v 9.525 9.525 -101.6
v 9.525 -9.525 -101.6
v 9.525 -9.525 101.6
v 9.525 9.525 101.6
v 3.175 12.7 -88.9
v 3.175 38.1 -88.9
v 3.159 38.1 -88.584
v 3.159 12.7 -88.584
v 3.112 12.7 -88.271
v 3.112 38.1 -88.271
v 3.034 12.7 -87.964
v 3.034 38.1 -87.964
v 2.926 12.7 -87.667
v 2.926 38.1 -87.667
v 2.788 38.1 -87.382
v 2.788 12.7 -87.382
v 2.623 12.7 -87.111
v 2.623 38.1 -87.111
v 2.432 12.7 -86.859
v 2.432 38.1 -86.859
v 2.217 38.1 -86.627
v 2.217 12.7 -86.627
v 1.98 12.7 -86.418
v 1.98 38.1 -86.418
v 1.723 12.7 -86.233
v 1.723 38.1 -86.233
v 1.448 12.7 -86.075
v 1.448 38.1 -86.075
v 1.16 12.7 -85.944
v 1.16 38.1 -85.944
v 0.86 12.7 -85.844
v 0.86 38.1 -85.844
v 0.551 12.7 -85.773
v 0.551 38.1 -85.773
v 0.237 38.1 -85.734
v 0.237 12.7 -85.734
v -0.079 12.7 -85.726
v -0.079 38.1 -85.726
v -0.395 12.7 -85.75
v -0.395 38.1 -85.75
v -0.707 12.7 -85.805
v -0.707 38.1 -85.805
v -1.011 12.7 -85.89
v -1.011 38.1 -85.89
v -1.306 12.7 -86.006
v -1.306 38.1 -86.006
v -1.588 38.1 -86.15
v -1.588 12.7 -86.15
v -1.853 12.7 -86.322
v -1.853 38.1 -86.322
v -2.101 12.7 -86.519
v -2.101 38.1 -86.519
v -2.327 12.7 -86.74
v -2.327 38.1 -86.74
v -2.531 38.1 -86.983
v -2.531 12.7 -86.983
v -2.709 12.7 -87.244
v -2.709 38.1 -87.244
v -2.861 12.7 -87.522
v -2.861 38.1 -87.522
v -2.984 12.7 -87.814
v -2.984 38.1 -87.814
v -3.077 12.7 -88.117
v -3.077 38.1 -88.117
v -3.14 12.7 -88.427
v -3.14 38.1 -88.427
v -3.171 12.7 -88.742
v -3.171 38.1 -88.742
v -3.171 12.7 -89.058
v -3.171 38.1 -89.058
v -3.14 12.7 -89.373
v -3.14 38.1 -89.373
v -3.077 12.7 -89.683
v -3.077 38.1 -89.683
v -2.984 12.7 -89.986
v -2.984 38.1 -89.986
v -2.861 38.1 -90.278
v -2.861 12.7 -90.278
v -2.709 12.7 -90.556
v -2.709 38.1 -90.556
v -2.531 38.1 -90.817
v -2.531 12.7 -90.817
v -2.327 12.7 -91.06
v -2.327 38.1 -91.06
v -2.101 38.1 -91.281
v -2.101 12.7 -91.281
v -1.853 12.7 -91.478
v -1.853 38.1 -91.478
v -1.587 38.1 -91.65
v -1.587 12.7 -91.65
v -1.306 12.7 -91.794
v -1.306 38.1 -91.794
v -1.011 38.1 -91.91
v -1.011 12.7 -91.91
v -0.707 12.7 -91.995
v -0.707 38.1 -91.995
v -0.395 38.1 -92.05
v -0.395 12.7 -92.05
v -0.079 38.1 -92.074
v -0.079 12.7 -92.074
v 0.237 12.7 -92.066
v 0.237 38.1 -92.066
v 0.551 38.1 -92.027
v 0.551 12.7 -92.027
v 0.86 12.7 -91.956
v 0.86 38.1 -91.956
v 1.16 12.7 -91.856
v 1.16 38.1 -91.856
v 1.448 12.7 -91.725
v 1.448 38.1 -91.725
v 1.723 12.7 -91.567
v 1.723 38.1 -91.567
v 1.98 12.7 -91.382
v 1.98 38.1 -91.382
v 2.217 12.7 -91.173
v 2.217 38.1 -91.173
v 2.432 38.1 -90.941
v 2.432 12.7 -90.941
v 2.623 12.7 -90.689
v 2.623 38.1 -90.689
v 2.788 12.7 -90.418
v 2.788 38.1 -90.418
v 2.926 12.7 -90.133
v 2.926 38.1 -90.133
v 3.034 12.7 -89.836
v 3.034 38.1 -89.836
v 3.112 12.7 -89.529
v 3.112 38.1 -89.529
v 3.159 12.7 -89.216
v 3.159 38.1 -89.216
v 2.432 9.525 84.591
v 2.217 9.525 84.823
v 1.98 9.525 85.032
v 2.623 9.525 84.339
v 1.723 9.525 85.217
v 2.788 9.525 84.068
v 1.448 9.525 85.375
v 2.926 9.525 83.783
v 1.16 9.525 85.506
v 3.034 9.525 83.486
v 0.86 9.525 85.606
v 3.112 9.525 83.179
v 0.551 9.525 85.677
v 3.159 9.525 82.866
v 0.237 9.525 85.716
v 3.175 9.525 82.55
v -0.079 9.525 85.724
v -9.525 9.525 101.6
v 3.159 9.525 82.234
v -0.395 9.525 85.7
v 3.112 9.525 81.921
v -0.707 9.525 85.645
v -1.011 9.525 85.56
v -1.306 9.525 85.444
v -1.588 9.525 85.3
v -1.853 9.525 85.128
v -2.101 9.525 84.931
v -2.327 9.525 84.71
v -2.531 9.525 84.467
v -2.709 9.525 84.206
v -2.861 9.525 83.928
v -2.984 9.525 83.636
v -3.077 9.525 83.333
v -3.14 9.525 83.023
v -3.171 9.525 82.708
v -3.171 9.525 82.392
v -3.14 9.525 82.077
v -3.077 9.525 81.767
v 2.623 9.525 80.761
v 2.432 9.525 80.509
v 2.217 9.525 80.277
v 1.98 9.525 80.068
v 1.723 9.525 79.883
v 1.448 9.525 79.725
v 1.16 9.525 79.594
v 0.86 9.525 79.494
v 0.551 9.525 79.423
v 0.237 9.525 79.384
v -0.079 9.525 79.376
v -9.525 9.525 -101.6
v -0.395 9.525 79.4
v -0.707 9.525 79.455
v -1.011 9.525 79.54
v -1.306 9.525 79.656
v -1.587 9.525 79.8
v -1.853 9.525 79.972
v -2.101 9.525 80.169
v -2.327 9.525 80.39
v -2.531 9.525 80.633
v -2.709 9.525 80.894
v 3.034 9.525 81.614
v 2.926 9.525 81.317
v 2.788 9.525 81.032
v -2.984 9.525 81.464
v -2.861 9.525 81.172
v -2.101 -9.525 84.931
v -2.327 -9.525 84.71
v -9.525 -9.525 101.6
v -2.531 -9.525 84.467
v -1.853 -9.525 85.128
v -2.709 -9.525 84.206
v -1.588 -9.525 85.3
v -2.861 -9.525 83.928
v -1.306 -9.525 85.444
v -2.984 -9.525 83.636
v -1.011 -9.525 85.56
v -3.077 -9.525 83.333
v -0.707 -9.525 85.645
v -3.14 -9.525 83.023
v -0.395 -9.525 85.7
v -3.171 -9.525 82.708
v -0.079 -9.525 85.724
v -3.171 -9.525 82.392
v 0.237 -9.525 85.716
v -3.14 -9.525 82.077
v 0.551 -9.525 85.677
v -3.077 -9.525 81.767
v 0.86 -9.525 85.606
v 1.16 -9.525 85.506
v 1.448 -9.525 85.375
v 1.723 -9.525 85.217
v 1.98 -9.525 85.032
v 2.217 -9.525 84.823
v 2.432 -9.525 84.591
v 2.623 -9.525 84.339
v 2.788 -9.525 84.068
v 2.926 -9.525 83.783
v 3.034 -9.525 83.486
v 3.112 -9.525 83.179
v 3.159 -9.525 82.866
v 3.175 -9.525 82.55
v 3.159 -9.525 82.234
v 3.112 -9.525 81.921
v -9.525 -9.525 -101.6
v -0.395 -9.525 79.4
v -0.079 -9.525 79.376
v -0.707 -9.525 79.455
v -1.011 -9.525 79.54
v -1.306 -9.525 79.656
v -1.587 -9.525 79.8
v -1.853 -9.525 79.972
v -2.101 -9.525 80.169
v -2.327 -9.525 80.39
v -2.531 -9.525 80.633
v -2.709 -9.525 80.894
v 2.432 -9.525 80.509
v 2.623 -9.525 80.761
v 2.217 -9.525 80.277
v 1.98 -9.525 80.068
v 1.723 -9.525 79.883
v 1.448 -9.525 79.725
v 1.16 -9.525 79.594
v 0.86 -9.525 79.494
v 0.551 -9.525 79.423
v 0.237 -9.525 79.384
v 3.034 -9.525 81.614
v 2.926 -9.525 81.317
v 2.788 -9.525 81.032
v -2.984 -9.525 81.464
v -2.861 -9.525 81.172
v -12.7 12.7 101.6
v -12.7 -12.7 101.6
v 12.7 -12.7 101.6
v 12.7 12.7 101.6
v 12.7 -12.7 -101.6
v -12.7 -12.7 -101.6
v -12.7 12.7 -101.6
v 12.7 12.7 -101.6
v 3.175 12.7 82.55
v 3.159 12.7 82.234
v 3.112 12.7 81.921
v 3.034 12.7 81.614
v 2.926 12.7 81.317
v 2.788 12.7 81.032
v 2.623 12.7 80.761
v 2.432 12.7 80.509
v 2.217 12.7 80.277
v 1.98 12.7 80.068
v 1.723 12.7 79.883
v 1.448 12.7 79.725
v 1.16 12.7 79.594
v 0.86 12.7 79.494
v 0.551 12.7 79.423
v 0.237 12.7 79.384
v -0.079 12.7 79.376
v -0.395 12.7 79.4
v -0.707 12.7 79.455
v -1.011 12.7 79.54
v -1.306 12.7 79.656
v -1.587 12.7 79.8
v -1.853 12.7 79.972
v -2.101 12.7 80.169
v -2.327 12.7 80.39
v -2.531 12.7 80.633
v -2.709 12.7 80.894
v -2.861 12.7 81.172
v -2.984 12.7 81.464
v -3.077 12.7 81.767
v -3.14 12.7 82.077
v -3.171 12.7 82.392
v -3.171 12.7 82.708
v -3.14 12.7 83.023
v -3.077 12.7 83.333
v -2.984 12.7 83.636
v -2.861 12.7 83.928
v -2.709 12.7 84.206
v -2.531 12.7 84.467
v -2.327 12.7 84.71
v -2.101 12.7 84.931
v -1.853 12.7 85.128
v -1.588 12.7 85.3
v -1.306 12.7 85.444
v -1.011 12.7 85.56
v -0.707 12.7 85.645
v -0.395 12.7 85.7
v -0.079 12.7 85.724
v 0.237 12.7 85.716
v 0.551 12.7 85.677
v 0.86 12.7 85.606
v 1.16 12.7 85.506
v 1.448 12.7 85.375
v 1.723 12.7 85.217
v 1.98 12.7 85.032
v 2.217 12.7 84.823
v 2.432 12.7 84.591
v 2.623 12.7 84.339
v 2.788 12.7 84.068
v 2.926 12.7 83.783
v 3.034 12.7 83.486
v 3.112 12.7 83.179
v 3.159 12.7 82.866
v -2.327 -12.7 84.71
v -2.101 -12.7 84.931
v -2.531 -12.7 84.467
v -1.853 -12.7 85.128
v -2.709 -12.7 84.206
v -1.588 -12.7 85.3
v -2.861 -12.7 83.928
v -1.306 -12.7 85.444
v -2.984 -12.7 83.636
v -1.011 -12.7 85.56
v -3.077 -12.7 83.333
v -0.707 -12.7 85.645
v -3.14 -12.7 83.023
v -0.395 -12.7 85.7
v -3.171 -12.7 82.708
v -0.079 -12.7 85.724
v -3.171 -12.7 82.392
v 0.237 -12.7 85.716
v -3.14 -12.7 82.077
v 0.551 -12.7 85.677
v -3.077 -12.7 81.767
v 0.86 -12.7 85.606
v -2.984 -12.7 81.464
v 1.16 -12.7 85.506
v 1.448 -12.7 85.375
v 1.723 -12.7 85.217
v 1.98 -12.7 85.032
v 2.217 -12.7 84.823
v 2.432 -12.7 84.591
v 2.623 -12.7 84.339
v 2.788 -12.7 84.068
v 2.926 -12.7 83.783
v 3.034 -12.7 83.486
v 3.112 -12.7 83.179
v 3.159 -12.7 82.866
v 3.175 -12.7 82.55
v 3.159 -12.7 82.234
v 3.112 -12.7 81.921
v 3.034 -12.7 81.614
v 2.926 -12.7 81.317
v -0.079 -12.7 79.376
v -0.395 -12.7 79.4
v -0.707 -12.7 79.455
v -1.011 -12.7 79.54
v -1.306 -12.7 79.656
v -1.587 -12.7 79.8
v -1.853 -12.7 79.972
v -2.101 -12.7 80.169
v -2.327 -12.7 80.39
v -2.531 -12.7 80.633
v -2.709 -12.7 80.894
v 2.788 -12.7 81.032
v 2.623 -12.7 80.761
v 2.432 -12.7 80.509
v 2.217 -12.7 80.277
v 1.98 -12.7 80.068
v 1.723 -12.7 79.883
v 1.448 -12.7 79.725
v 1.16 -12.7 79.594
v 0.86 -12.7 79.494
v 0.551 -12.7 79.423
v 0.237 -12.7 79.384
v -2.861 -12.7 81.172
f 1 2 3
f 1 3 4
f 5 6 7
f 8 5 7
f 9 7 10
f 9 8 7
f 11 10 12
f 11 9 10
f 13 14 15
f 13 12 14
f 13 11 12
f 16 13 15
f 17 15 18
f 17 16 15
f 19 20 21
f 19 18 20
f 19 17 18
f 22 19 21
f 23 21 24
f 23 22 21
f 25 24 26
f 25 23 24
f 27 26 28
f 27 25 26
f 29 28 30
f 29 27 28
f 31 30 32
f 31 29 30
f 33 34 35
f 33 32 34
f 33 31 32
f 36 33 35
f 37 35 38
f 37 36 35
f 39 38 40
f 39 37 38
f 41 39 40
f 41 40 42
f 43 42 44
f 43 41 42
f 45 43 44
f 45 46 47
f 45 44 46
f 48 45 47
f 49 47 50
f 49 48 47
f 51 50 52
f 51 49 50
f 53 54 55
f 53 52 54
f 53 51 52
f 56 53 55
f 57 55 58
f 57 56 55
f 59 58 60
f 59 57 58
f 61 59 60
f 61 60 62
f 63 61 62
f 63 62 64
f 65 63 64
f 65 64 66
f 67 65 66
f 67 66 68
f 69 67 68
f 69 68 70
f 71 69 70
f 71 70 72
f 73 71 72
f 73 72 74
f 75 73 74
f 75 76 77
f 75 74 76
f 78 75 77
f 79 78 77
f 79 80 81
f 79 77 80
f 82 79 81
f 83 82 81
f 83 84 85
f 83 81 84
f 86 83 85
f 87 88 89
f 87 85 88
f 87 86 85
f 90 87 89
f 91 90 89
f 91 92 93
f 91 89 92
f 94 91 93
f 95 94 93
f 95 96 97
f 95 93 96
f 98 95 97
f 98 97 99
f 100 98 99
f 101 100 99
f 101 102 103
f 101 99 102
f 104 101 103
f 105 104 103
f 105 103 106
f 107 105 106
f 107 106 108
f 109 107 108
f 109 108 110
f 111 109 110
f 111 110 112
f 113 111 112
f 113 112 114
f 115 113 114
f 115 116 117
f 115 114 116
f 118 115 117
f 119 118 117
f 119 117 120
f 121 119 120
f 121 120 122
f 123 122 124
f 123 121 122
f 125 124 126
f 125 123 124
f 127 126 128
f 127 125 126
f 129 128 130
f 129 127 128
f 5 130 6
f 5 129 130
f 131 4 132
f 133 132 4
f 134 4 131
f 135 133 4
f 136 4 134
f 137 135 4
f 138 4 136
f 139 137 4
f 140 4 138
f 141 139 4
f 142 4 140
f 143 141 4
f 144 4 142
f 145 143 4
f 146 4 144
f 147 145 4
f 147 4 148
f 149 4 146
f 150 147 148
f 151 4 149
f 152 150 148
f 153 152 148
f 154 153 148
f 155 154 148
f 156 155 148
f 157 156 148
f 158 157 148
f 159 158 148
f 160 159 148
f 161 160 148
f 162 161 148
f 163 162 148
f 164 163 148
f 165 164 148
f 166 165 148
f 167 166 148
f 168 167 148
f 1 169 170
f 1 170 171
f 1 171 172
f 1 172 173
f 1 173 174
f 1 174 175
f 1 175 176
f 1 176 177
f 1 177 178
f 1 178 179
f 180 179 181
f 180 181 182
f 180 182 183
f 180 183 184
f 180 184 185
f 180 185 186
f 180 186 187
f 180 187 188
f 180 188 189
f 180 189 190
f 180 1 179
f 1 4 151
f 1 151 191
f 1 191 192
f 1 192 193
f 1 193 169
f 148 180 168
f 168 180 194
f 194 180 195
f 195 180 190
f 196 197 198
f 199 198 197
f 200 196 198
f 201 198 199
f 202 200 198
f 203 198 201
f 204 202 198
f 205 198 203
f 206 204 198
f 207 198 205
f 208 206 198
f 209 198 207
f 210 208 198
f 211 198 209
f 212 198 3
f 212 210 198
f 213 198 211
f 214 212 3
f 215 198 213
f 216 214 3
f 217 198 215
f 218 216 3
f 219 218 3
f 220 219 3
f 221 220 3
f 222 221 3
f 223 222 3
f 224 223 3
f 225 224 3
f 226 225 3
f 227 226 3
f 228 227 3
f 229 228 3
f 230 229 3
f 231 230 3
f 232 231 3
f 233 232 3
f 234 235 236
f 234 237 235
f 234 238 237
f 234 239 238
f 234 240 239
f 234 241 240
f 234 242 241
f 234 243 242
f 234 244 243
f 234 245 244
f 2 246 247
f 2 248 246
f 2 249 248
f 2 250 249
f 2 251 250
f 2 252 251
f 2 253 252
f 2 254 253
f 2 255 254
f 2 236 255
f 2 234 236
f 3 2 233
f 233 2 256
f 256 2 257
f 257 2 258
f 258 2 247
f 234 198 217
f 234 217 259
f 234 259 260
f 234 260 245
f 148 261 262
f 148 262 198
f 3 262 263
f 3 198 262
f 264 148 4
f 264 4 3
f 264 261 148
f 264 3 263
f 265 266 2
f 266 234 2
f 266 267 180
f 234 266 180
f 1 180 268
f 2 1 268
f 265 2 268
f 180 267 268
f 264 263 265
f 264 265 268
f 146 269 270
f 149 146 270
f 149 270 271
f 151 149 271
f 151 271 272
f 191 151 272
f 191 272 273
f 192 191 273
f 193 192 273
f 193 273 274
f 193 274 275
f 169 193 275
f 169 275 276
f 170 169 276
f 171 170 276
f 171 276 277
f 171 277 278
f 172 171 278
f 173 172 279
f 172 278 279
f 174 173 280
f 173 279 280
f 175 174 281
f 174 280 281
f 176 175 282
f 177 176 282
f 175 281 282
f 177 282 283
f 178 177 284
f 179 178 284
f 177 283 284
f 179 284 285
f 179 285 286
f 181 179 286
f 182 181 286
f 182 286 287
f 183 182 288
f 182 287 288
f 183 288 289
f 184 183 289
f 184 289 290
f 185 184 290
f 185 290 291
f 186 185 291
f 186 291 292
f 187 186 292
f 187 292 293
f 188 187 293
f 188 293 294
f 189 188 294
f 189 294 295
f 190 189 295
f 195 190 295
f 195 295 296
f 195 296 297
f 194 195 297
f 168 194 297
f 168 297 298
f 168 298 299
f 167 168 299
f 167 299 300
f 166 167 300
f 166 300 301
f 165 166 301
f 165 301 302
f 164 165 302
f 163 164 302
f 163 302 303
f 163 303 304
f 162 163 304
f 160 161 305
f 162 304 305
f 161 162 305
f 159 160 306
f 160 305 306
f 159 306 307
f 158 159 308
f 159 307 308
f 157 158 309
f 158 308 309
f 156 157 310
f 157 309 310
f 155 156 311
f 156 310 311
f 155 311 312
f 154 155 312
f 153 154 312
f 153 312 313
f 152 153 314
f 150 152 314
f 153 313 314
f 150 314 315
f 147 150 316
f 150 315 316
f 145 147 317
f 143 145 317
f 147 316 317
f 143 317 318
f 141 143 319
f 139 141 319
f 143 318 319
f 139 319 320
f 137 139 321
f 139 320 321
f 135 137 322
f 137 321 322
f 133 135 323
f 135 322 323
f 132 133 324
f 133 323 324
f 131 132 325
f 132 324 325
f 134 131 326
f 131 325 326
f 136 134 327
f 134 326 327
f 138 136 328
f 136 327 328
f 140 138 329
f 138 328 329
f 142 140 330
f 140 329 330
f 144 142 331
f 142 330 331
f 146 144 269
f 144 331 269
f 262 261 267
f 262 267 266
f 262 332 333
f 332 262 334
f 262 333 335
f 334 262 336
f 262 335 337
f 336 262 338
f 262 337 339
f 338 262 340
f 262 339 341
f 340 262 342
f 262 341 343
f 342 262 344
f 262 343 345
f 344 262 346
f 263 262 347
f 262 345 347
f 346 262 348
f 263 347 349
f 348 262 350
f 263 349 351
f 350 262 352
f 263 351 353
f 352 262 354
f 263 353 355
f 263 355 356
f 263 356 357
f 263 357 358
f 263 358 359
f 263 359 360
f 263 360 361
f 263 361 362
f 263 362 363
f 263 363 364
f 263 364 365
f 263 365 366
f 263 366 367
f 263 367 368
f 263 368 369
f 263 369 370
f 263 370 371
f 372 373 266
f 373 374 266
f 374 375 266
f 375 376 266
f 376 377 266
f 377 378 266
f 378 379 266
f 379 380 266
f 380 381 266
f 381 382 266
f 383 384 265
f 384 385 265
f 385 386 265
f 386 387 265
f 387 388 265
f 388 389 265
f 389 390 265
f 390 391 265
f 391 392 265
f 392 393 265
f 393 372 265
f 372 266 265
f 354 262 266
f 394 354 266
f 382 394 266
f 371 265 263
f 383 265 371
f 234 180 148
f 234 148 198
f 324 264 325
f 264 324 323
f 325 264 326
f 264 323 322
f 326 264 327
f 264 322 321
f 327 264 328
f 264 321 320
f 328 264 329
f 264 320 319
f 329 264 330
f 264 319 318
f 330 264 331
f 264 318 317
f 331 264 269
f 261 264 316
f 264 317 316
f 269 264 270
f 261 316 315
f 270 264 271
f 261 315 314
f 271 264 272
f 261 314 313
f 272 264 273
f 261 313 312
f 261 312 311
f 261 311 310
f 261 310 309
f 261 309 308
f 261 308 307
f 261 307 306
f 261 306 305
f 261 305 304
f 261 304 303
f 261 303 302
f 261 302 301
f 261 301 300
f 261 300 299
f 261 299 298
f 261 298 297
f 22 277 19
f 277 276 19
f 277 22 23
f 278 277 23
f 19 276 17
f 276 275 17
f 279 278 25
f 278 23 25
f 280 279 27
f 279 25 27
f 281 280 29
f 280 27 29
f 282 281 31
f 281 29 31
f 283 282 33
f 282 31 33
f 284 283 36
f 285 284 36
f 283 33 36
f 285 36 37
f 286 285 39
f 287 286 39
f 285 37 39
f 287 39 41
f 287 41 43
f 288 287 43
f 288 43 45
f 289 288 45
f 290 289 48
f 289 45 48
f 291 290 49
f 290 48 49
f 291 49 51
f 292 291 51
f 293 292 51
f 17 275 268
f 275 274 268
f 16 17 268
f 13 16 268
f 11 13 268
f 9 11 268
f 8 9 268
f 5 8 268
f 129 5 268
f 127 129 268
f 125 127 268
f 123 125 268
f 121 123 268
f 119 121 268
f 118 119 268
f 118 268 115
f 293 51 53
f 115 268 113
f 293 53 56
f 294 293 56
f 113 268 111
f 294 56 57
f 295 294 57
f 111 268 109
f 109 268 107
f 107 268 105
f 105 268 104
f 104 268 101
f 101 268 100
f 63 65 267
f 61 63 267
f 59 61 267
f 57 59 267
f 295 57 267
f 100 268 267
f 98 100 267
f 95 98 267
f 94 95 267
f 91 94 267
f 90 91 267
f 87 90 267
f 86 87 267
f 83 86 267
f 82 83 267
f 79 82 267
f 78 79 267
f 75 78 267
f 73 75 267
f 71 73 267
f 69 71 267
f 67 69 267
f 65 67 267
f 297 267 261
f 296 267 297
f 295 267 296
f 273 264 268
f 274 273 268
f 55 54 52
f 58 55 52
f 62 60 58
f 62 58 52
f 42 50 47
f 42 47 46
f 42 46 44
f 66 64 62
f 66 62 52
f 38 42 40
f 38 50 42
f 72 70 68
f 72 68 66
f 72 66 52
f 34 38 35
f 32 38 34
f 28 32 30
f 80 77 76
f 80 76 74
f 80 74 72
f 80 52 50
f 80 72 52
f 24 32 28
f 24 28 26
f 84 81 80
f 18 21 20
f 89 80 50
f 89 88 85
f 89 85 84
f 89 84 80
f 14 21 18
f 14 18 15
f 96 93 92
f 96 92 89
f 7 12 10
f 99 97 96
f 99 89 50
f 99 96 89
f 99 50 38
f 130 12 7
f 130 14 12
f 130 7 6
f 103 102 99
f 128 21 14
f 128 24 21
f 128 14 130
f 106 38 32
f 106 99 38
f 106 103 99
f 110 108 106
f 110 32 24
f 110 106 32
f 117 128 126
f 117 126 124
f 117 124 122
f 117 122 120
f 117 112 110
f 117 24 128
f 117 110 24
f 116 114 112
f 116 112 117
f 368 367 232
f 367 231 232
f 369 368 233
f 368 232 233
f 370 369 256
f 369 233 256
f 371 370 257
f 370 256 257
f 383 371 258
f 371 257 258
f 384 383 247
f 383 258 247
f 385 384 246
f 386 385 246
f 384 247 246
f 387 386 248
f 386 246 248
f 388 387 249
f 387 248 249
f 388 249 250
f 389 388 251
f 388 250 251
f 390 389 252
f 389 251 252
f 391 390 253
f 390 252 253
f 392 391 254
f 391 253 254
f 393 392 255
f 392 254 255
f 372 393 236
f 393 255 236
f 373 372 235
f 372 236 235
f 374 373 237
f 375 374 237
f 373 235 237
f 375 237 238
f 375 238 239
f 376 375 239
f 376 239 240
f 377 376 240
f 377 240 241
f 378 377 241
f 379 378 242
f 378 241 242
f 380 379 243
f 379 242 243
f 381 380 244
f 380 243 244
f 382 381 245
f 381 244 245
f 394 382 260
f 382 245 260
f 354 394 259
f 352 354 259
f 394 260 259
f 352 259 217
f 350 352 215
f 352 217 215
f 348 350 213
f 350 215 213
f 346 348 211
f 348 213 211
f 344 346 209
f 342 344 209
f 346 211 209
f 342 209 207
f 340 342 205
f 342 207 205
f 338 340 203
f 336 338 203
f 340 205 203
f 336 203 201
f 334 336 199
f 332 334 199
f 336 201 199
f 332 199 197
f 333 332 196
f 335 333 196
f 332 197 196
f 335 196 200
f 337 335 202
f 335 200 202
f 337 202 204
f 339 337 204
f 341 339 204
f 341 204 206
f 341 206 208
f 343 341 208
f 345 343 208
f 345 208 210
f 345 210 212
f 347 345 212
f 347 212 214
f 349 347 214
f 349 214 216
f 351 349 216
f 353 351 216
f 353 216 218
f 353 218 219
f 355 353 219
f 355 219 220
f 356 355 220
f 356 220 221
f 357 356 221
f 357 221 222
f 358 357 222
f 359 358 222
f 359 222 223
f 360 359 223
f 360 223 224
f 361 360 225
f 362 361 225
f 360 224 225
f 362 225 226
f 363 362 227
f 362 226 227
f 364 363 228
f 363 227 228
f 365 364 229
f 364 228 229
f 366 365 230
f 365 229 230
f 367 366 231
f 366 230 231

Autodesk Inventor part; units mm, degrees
ref_plane "YZ Plane" through (0, 0, 0) normal (1, 0, 0) x (0, 1, 0)
ref_plane "XZ Plane" through (0, 0, 0) normal (0, 1, 0) x (-1, 0, 0)
ref_plane "XY Plane" through (0, 0, 0) normal (0, 0, 1) x (1, 0, 0)
sketch "Sketch1" plane through (0, 0, 0) normal (0, 0, 1) x (1, 0, 0)
  line L0 (-12.7, -12.7) -> (12.7, -12.7)
  line L1 (12.7, -12.7) -> (12.7, 12.7)
  line L2 (12.7, 12.7) -> (-12.7, 12.7)
  line L3 (-12.7, 12.7) -> (-12.7, -12.7)
  line L4 (-12.7, -12.7) -> (12.7, 12.7) construction
  line L5 (12.7, -12.7) -> (-12.7, 12.7) construction
  line L6 (-9.525, -9.525) -> (9.525, -9.525)
  line L7 (9.525, -9.525) -> (9.525, 9.525)
  line L8 (9.525, 9.525) -> (-9.525, 9.525)
  line L9 (-9.525, 9.525) -> (-9.525, -9.525)
  line L10 (-9.525, -9.525) -> (9.525, 9.525) construction
  line L11 (9.525, -9.525) -> (-9.525, 9.525) construction
  point P0 (0, 0)
  dimension "d0" = 3.175
  dimension "d1" = 25.4
extrude "Extrusion1" add sketch "Sketch1" along normal mid plane 203.2
sketch "Sketch2" plane through (-12.7, 12.7, 101.6) normal (0, 1, 0) x (1, 0, 0)
  line L0 (0, 203.2) -> (25.4, 203.2) construction
  line L1 (12.7, 203.2) -> (12.7, 0) construction
  line L2 (22.225, 0) -> (3.175, 0) construction
  circle A0 centre (12.7, 19.05) radius 3.175
  line L3 (25.4, 0) -> (0, 0) projected
  point P0 (12.7, 101.6)
  dimension "d4" = 6.35
  dimension "d5" = 19.05
extrude "Extrusion2" cut sketch "Sketch2" against normal through all
sketch "Sketch3" plane through (-12.7, 12.7, 101.6) normal (0, 1, 0) x (1, 0, 0)
  line L0 (0, 203.2) -> (25.4, 203.2) construction
  line L1 (12.7, 203.2) -> (12.7, 0) construction
  line L2 (25.4, 0) -> (0, 0) construction
  circle A0 centre (12.7, 190.5) radius 3.175
  point P0 (12.7, 101.6)
  dimension "d8" = 6.35
  dimension "d9" = 12.7
extrude "Extrusion3" add sketch "Sketch3" along normal blind 25.4
properties part number "1x1x8 Rectangular Tubing"
